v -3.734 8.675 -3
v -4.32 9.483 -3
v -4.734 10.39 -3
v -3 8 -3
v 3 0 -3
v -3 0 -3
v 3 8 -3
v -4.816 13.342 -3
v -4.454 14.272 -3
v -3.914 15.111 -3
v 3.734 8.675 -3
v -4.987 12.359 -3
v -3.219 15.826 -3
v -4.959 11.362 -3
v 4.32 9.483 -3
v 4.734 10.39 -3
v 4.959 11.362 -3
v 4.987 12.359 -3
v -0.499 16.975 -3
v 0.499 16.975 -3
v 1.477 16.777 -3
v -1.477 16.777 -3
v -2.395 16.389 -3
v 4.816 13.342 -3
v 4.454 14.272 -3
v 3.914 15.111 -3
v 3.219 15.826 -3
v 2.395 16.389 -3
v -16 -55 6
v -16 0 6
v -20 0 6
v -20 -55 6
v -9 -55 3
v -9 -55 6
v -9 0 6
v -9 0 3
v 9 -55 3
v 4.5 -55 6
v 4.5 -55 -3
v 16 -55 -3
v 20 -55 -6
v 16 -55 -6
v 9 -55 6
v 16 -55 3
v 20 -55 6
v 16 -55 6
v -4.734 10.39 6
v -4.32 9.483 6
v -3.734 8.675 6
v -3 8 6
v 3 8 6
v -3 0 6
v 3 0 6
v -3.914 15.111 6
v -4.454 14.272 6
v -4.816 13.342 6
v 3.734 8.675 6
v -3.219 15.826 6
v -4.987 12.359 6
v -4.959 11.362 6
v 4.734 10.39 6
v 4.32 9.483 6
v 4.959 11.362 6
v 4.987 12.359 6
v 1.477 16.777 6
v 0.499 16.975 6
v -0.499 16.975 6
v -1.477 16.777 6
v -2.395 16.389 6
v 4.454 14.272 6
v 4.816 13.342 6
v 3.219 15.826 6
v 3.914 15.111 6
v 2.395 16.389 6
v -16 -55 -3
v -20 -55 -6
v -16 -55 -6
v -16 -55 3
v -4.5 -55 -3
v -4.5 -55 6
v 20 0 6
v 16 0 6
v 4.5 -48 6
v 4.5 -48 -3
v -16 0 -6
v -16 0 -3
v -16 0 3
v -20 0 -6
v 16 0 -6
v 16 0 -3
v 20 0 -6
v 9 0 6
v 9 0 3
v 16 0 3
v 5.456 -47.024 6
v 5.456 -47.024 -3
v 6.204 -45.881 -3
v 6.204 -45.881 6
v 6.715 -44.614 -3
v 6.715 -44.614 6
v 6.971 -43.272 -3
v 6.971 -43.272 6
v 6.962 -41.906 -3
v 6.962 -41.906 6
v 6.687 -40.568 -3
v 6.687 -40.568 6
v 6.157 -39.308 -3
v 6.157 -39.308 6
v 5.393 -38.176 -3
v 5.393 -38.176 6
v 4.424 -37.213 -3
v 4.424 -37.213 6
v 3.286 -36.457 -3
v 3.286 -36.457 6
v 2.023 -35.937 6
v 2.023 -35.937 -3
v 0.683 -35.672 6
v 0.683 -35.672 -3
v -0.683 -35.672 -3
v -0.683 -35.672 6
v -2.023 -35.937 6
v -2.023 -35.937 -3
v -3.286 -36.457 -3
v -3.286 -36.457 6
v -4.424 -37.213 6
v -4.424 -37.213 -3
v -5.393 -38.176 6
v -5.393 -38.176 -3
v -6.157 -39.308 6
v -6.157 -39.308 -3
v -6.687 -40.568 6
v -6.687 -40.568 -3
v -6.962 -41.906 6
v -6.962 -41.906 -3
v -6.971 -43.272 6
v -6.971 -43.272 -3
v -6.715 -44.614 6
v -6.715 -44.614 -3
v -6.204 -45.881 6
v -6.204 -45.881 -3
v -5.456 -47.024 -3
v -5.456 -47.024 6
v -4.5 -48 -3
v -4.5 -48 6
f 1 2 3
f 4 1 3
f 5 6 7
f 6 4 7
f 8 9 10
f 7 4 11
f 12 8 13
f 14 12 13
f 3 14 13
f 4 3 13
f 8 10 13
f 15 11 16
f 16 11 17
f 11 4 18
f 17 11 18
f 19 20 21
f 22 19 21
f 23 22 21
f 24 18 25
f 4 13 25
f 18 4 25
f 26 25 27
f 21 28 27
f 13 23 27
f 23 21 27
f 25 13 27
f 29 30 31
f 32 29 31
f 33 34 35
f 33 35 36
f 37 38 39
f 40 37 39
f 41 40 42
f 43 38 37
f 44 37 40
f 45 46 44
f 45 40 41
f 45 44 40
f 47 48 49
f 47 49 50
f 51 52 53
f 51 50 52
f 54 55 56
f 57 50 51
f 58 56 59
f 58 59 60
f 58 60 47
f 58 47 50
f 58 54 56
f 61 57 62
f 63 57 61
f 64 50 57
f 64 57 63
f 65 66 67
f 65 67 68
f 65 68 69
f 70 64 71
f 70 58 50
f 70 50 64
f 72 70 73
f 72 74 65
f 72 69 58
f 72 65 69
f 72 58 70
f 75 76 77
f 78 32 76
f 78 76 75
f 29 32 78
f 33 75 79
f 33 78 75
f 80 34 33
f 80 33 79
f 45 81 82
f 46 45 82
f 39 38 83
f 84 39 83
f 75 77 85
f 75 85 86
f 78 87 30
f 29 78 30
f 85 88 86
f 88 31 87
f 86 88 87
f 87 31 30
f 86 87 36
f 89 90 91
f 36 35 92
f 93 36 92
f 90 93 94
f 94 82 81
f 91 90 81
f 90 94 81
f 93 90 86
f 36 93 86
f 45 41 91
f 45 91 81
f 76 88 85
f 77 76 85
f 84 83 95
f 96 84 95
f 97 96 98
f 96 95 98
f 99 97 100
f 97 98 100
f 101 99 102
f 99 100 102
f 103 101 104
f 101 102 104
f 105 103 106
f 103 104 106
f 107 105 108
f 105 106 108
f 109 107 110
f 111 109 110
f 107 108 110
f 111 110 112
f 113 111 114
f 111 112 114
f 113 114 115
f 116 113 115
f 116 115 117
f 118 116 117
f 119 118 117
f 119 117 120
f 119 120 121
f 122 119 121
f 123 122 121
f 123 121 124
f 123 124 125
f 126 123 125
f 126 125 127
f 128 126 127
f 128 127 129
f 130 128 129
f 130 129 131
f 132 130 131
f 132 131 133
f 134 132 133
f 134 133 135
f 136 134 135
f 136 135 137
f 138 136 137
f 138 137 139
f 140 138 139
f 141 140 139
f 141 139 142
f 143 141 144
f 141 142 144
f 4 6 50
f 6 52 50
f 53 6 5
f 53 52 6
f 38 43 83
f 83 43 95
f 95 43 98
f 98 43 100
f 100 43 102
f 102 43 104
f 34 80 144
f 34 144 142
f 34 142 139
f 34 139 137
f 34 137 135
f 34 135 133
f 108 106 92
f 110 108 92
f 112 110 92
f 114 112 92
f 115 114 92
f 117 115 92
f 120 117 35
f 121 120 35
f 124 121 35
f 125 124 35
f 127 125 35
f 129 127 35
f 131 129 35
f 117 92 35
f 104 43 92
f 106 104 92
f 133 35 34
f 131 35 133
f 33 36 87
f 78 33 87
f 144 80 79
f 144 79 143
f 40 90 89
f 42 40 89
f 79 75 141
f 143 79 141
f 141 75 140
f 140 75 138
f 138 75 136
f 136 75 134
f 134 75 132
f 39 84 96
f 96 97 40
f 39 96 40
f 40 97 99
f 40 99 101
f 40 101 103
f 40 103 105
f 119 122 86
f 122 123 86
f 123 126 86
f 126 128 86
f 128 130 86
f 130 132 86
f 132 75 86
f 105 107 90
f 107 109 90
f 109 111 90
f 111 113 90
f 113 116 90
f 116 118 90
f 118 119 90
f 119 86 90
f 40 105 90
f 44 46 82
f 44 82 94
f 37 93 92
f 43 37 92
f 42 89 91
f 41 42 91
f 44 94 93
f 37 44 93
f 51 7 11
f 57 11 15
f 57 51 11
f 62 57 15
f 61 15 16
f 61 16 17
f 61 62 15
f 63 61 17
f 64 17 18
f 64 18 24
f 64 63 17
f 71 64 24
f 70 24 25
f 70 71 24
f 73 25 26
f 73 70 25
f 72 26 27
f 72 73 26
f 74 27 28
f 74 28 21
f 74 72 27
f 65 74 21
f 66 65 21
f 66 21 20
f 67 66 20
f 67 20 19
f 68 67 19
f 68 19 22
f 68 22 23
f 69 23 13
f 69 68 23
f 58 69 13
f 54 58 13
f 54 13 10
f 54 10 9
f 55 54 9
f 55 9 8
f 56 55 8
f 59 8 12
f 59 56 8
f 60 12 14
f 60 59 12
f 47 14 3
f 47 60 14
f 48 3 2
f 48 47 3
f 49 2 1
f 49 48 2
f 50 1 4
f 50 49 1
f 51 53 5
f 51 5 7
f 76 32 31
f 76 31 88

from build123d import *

# Parameters (mm, degrees)
PAD_DEPTH         = 55
POCKET_DEPTH      = 12.001
PAD001_DEPTH      = 6
PAD001_DEPTH_BACK = 3


with BuildPart() as body:
    # Sketch → Pad (new body)
    with BuildSketch(Plane.XZ):
        Polygon((-20, 6), (-20, -6), (-16, -6), (-16, -3), (-9, -3), (9, -3), (16, -3), (16, -6), (20, -6), (20, 6), (16, 6), (16, 3), (9, 3), (9, 6), (-9, 6), (-9, 3), (-16, 3), (-16, 6), align=None)
    extrude(amount=PAD_DEPTH)

    # Sketch002 (on Face14 of Pad) → Pocket (cut, through all)
    with BuildSketch(Plane(origin=(0, 0, 6), x_dir=(-1, 0, 0), z_dir=(0, 0, 1))):
        with BuildLine():
            Line((-4.5, 55), (4.5, 55))
            Line((4.5, 55), (4.5, 48))
            ThreePointArc((-4.5, 48), (0, 35.638097), (4.5, 48))
            Line((-4.5, 55), (-4.5, 48))
        make_face()
    extrude(amount=-POCKET_DEPTH, mode=Mode.SUBTRACT)


with BuildPart() as body001:
    # Sketch001 → Pad001 (new body, two sides)
    with BuildSketch(Plane.XY) as pad001_sk:
        with BuildLine():
            Line((-3, 0), (3, 0))
            Line((3, 0), (3, 8))
            ThreePointArc((3, 8), (0, 17), (-3, 8))
            Line((-3, 0), (-3, 8))
        make_face()
    extrude(amount=PAD001_DEPTH)
    extrude(pad001_sk.sketch, amount=-PAD001_DEPTH_BACK)


solid = Compound([body.part, body001.part])
